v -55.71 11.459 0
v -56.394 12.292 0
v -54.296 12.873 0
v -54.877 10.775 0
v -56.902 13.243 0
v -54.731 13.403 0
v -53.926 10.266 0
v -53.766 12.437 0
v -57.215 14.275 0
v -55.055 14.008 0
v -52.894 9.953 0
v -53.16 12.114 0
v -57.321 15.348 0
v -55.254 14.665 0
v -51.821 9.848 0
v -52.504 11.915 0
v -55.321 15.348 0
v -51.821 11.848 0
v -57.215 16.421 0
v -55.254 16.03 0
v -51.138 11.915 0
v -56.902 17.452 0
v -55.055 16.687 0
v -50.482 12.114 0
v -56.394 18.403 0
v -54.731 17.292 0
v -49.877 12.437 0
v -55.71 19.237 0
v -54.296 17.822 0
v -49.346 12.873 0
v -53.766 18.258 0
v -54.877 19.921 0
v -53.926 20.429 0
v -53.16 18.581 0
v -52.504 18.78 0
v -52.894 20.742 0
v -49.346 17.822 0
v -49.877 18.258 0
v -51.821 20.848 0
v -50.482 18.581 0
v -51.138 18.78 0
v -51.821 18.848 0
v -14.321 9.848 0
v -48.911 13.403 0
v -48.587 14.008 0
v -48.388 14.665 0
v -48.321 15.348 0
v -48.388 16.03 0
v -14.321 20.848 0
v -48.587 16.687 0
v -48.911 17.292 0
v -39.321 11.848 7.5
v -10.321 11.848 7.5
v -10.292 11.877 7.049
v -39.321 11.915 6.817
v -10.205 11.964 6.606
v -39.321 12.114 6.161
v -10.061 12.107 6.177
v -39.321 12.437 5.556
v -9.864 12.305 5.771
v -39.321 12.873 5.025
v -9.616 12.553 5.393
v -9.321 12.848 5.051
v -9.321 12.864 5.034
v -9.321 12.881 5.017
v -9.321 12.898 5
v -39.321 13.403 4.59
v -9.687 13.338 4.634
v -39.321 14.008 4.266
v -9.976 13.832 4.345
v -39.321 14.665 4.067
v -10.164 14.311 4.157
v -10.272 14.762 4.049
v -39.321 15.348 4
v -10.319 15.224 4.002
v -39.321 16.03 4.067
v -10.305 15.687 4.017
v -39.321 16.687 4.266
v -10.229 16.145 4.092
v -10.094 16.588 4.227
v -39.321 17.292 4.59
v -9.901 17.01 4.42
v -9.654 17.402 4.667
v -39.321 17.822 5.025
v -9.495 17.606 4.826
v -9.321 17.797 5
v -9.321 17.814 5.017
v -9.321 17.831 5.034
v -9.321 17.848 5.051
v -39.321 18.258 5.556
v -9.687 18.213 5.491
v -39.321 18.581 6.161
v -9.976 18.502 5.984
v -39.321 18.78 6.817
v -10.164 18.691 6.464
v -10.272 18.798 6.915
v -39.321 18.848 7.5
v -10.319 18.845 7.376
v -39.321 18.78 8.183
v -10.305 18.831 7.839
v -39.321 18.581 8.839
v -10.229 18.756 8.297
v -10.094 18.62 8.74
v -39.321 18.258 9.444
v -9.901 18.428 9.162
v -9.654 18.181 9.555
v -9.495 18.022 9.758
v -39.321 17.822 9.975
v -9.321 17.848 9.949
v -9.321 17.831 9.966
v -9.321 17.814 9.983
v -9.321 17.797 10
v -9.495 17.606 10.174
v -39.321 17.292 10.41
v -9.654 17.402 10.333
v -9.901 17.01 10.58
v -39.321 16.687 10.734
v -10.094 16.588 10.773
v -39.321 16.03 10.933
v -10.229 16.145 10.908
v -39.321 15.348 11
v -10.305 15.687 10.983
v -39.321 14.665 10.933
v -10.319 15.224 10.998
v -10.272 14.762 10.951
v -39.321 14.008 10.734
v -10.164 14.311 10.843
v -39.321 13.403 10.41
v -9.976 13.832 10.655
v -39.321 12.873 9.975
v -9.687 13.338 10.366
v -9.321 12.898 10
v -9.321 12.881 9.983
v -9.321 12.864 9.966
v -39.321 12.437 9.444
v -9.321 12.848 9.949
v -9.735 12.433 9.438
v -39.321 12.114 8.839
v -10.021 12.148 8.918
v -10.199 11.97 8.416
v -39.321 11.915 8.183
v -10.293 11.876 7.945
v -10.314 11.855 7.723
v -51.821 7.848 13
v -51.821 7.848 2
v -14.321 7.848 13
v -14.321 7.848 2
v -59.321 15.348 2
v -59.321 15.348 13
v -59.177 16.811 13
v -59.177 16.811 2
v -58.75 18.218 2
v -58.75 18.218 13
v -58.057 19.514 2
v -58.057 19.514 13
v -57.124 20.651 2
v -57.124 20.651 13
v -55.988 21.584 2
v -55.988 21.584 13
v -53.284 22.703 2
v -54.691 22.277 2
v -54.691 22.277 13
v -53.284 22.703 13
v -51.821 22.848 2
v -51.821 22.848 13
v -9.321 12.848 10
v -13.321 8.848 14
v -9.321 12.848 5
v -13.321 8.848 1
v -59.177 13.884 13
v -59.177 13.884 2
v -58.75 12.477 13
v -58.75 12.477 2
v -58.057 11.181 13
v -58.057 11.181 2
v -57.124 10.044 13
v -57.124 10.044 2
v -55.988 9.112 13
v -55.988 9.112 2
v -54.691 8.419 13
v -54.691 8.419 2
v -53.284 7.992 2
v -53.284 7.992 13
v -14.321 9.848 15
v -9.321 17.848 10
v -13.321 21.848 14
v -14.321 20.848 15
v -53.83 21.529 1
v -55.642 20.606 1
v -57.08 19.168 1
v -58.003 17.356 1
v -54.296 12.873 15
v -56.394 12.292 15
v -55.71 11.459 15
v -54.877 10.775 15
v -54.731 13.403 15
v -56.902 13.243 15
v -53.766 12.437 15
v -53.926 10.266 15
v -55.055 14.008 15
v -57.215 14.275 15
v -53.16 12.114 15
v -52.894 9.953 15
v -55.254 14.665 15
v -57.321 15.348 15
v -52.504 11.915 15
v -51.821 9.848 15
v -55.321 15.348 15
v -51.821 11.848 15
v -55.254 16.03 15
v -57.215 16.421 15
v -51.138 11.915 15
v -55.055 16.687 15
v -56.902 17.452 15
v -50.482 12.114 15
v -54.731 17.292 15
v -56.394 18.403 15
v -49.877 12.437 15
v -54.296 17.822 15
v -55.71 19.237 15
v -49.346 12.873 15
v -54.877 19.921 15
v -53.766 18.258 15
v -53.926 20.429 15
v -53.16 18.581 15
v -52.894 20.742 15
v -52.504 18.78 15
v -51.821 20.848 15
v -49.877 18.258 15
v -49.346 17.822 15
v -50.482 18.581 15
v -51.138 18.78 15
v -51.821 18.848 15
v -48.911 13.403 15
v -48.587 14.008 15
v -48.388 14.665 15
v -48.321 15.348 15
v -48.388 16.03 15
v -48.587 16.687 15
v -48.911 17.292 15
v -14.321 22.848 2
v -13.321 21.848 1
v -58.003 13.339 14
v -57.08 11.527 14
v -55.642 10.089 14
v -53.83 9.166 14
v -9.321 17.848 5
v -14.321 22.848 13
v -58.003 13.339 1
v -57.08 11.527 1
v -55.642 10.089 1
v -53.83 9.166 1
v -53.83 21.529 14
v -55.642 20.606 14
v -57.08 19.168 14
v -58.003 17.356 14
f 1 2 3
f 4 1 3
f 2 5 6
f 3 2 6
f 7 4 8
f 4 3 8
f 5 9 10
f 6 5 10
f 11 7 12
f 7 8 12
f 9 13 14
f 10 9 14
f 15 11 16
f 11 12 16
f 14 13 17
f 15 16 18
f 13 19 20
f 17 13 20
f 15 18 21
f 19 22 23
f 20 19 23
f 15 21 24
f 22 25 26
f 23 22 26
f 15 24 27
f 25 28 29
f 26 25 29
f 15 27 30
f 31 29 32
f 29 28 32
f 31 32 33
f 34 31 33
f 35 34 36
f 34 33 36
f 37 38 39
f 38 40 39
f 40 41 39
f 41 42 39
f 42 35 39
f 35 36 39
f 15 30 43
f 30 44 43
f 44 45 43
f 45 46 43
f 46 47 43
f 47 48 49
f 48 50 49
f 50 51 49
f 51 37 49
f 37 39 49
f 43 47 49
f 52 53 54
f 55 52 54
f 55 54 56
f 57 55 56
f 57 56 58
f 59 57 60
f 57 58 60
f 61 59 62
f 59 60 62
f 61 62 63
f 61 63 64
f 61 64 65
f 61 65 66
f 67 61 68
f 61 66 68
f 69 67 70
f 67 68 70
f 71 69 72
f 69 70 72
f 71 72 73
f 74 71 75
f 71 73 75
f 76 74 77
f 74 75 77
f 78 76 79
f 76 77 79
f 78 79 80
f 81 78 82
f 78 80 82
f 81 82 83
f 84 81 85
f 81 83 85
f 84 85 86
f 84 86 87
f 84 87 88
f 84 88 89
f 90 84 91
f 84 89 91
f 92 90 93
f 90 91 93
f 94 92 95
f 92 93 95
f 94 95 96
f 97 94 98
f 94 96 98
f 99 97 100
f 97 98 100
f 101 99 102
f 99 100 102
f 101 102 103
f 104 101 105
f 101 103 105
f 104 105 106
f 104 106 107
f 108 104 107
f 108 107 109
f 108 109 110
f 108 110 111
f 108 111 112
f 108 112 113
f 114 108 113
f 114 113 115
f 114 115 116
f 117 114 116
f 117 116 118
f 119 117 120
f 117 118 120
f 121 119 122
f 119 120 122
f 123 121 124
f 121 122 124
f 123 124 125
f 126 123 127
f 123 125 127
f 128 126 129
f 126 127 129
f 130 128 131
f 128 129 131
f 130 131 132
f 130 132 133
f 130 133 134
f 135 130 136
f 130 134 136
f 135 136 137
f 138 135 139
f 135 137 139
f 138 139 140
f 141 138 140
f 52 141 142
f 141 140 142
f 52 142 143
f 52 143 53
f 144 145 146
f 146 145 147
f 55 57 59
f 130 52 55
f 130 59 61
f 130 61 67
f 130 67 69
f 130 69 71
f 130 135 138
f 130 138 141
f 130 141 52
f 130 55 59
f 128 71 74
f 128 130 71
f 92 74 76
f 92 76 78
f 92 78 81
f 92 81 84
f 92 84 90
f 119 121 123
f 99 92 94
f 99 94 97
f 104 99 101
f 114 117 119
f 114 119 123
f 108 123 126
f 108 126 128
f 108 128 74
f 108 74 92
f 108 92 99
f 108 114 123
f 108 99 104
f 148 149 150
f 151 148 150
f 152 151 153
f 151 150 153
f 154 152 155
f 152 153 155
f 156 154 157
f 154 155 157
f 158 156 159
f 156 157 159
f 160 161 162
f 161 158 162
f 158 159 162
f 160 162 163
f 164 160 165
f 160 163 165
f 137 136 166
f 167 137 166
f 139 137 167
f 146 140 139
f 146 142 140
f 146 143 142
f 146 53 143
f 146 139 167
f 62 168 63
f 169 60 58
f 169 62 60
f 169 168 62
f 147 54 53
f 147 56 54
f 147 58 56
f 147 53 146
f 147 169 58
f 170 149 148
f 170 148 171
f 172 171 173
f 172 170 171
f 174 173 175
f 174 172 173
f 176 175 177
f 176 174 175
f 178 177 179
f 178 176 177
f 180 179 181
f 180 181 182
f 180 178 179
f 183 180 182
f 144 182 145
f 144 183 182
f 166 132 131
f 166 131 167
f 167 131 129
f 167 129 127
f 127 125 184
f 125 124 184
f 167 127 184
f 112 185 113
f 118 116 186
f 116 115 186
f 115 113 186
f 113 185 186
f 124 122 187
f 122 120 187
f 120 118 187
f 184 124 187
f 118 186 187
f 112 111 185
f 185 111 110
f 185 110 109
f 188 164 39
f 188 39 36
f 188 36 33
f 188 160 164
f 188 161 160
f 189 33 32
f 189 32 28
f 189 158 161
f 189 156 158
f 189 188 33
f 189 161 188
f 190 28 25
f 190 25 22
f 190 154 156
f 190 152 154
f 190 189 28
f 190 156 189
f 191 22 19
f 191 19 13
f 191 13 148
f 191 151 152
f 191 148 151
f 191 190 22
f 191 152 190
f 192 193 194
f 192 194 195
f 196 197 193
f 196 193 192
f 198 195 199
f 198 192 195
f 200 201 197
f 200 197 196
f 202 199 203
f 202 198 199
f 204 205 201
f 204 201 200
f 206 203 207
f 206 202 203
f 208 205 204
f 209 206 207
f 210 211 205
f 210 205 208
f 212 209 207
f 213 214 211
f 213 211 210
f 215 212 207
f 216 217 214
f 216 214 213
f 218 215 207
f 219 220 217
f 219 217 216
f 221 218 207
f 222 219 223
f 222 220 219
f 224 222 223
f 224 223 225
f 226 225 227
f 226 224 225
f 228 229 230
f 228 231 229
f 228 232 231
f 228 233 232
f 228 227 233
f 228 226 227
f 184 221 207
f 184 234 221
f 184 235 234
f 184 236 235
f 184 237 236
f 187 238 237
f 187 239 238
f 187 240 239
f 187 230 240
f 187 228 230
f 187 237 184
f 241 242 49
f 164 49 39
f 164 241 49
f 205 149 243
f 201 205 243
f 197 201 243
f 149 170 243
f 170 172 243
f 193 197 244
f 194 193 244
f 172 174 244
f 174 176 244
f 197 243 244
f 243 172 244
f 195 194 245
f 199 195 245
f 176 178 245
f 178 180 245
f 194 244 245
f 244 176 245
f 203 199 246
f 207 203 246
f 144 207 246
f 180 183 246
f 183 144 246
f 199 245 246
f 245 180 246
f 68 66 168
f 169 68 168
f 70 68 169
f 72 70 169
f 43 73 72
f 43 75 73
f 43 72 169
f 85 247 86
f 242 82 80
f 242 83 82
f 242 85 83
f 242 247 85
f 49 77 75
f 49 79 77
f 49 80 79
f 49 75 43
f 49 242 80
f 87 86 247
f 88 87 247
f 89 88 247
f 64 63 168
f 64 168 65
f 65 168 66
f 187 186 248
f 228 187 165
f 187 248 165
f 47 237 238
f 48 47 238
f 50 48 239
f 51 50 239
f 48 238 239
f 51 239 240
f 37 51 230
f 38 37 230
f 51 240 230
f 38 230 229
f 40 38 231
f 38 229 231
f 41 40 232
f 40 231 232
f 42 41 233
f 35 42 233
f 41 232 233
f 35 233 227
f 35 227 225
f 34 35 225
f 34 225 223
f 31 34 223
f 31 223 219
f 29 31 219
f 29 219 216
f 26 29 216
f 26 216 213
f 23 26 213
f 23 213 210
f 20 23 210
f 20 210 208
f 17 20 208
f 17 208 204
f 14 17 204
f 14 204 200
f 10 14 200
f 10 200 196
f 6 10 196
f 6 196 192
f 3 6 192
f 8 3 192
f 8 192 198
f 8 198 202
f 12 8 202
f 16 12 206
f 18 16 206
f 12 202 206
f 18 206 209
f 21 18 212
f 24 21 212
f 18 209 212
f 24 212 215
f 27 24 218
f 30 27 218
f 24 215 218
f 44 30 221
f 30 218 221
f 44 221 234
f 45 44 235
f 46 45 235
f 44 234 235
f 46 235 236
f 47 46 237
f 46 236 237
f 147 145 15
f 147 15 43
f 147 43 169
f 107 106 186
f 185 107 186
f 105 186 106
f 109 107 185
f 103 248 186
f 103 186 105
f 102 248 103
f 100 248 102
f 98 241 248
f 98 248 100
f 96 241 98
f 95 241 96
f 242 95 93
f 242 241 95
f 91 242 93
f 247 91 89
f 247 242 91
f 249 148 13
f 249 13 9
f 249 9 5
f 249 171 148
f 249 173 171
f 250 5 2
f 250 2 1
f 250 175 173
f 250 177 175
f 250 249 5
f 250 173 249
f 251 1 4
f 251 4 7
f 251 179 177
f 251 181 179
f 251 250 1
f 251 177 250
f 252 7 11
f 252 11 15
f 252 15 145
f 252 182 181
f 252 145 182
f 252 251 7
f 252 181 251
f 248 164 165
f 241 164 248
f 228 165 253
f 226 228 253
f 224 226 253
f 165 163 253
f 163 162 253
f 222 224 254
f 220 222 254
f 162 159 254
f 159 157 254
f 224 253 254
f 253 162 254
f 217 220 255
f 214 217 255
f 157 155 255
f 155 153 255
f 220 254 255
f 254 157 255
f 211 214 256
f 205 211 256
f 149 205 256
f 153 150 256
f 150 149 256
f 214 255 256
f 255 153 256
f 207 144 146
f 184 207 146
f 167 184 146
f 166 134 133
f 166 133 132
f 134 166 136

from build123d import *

# Parameters (mm, degrees)
F0_W        = 50
F0_H        = 15
F1_DEPTH    = 15
F2_R        = 7.49999
F3_R        = 3.5
F4_DEPTH    = 25
F6_DEPTH    = 30
F7_SIZE     = 2
F8_T1_DEPTH = 36.7168298797
F8_T3_DEPTH = 36.7168298797


# Not quite as in the source:
# - a fillet or chamfer that OpenCascade refuses, or shapes differently, is made with other operations: its cross-section is extruded or revolved along the edge and cut away or added
# - a fillet or chamfer is up to 0.001 mm smaller than in the source, because OpenCascade refuses the exact size


with BuildPart() as f1:
    # F0 (on Top) → F1 (new body)
    with BuildSketch(Plane.XY):
        with Locations((-34.3210311607, 15.3476024792)):
            Rectangle(F0_W, F0_H)
    extrude(amount=F1_DEPTH)

    # F2 (radius 7.5 in the source; OpenCascade refuses exactly that, so slightly less here)
    f2_edges = [f1.edges().sort_by_distance(p)[0] for p in [
        (-59.321031, 22.847602, 7.5),
        (-59.321031, 7.847602, 7.5),
    ]]
    fillet(f2_edges, radius=F2_R)

    # F3 (on face) → F4 (cut)
    with BuildSketch(Plane.XY.offset(15)):
        with Locations((-51.8210311607, 15.3476024792)):
            Circle(F3_R)
    extrude(amount=-F4_DEPTH, mode=Mode.SUBTRACT)

    # F5 (on face) → F6 (cut)
    with BuildSketch(Plane.YZ.offset(-9.3210311607)):
        with BuildLine():
            ThreePointArc((18.8476024792, 7.5), (15.3476024792, 11), (11.8476024792, 7.5))
            ThreePointArc((11.8476024792, 7.5), (15.3476024792, 4), (18.8476024792, 7.5))
        make_face()
    extrude(amount=-F6_DEPTH, mode=Mode.SUBTRACT)

    # F7
    f7_edges = [f1.edges().sort_by_distance(p)[0] for p in [
        (-30.571036, 7.847602, 15),
        (-30.571036, 7.847602, 0),
    ]]
    chamfer(f7_edges, length=F7_SIZE)

    # F8: chamfer of 5 on 4 edges, made by hand

    # F8_s2 → F8_t1 (cut)
    with BuildSketch(Plane.XZ.offset(-33.706017419)):
        Polygon((-9.3210311607, 10), (-14.3210311607, 15), (-9.3210311607, 15), align=None)
        Polygon((-9.3210311607, 5), (-14.3210311607, 0), (-9.3210311607, 0), align=None)
    extrude(amount=F8_T1_DEPTH, mode=Mode.SUBTRACT)

    # F8_s4 → F8_t3 (cut)
    with BuildSketch(Plane.XY.offset(-10.8584149398)):
        Polygon((-9.3210311607, 12.8476024792), (-14.3210311607, 7.8476024792), (-9.3210311607, 7.8476024792), align=None)
        Polygon((-14.3210311607, 22.8476024792), (-9.3210311607, 17.8476024792), (-9.3210311607, 22.8476024792), align=None)
    extrude(amount=F8_T3_DEPTH, mode=Mode.SUBTRACT)


solid = f1.part
